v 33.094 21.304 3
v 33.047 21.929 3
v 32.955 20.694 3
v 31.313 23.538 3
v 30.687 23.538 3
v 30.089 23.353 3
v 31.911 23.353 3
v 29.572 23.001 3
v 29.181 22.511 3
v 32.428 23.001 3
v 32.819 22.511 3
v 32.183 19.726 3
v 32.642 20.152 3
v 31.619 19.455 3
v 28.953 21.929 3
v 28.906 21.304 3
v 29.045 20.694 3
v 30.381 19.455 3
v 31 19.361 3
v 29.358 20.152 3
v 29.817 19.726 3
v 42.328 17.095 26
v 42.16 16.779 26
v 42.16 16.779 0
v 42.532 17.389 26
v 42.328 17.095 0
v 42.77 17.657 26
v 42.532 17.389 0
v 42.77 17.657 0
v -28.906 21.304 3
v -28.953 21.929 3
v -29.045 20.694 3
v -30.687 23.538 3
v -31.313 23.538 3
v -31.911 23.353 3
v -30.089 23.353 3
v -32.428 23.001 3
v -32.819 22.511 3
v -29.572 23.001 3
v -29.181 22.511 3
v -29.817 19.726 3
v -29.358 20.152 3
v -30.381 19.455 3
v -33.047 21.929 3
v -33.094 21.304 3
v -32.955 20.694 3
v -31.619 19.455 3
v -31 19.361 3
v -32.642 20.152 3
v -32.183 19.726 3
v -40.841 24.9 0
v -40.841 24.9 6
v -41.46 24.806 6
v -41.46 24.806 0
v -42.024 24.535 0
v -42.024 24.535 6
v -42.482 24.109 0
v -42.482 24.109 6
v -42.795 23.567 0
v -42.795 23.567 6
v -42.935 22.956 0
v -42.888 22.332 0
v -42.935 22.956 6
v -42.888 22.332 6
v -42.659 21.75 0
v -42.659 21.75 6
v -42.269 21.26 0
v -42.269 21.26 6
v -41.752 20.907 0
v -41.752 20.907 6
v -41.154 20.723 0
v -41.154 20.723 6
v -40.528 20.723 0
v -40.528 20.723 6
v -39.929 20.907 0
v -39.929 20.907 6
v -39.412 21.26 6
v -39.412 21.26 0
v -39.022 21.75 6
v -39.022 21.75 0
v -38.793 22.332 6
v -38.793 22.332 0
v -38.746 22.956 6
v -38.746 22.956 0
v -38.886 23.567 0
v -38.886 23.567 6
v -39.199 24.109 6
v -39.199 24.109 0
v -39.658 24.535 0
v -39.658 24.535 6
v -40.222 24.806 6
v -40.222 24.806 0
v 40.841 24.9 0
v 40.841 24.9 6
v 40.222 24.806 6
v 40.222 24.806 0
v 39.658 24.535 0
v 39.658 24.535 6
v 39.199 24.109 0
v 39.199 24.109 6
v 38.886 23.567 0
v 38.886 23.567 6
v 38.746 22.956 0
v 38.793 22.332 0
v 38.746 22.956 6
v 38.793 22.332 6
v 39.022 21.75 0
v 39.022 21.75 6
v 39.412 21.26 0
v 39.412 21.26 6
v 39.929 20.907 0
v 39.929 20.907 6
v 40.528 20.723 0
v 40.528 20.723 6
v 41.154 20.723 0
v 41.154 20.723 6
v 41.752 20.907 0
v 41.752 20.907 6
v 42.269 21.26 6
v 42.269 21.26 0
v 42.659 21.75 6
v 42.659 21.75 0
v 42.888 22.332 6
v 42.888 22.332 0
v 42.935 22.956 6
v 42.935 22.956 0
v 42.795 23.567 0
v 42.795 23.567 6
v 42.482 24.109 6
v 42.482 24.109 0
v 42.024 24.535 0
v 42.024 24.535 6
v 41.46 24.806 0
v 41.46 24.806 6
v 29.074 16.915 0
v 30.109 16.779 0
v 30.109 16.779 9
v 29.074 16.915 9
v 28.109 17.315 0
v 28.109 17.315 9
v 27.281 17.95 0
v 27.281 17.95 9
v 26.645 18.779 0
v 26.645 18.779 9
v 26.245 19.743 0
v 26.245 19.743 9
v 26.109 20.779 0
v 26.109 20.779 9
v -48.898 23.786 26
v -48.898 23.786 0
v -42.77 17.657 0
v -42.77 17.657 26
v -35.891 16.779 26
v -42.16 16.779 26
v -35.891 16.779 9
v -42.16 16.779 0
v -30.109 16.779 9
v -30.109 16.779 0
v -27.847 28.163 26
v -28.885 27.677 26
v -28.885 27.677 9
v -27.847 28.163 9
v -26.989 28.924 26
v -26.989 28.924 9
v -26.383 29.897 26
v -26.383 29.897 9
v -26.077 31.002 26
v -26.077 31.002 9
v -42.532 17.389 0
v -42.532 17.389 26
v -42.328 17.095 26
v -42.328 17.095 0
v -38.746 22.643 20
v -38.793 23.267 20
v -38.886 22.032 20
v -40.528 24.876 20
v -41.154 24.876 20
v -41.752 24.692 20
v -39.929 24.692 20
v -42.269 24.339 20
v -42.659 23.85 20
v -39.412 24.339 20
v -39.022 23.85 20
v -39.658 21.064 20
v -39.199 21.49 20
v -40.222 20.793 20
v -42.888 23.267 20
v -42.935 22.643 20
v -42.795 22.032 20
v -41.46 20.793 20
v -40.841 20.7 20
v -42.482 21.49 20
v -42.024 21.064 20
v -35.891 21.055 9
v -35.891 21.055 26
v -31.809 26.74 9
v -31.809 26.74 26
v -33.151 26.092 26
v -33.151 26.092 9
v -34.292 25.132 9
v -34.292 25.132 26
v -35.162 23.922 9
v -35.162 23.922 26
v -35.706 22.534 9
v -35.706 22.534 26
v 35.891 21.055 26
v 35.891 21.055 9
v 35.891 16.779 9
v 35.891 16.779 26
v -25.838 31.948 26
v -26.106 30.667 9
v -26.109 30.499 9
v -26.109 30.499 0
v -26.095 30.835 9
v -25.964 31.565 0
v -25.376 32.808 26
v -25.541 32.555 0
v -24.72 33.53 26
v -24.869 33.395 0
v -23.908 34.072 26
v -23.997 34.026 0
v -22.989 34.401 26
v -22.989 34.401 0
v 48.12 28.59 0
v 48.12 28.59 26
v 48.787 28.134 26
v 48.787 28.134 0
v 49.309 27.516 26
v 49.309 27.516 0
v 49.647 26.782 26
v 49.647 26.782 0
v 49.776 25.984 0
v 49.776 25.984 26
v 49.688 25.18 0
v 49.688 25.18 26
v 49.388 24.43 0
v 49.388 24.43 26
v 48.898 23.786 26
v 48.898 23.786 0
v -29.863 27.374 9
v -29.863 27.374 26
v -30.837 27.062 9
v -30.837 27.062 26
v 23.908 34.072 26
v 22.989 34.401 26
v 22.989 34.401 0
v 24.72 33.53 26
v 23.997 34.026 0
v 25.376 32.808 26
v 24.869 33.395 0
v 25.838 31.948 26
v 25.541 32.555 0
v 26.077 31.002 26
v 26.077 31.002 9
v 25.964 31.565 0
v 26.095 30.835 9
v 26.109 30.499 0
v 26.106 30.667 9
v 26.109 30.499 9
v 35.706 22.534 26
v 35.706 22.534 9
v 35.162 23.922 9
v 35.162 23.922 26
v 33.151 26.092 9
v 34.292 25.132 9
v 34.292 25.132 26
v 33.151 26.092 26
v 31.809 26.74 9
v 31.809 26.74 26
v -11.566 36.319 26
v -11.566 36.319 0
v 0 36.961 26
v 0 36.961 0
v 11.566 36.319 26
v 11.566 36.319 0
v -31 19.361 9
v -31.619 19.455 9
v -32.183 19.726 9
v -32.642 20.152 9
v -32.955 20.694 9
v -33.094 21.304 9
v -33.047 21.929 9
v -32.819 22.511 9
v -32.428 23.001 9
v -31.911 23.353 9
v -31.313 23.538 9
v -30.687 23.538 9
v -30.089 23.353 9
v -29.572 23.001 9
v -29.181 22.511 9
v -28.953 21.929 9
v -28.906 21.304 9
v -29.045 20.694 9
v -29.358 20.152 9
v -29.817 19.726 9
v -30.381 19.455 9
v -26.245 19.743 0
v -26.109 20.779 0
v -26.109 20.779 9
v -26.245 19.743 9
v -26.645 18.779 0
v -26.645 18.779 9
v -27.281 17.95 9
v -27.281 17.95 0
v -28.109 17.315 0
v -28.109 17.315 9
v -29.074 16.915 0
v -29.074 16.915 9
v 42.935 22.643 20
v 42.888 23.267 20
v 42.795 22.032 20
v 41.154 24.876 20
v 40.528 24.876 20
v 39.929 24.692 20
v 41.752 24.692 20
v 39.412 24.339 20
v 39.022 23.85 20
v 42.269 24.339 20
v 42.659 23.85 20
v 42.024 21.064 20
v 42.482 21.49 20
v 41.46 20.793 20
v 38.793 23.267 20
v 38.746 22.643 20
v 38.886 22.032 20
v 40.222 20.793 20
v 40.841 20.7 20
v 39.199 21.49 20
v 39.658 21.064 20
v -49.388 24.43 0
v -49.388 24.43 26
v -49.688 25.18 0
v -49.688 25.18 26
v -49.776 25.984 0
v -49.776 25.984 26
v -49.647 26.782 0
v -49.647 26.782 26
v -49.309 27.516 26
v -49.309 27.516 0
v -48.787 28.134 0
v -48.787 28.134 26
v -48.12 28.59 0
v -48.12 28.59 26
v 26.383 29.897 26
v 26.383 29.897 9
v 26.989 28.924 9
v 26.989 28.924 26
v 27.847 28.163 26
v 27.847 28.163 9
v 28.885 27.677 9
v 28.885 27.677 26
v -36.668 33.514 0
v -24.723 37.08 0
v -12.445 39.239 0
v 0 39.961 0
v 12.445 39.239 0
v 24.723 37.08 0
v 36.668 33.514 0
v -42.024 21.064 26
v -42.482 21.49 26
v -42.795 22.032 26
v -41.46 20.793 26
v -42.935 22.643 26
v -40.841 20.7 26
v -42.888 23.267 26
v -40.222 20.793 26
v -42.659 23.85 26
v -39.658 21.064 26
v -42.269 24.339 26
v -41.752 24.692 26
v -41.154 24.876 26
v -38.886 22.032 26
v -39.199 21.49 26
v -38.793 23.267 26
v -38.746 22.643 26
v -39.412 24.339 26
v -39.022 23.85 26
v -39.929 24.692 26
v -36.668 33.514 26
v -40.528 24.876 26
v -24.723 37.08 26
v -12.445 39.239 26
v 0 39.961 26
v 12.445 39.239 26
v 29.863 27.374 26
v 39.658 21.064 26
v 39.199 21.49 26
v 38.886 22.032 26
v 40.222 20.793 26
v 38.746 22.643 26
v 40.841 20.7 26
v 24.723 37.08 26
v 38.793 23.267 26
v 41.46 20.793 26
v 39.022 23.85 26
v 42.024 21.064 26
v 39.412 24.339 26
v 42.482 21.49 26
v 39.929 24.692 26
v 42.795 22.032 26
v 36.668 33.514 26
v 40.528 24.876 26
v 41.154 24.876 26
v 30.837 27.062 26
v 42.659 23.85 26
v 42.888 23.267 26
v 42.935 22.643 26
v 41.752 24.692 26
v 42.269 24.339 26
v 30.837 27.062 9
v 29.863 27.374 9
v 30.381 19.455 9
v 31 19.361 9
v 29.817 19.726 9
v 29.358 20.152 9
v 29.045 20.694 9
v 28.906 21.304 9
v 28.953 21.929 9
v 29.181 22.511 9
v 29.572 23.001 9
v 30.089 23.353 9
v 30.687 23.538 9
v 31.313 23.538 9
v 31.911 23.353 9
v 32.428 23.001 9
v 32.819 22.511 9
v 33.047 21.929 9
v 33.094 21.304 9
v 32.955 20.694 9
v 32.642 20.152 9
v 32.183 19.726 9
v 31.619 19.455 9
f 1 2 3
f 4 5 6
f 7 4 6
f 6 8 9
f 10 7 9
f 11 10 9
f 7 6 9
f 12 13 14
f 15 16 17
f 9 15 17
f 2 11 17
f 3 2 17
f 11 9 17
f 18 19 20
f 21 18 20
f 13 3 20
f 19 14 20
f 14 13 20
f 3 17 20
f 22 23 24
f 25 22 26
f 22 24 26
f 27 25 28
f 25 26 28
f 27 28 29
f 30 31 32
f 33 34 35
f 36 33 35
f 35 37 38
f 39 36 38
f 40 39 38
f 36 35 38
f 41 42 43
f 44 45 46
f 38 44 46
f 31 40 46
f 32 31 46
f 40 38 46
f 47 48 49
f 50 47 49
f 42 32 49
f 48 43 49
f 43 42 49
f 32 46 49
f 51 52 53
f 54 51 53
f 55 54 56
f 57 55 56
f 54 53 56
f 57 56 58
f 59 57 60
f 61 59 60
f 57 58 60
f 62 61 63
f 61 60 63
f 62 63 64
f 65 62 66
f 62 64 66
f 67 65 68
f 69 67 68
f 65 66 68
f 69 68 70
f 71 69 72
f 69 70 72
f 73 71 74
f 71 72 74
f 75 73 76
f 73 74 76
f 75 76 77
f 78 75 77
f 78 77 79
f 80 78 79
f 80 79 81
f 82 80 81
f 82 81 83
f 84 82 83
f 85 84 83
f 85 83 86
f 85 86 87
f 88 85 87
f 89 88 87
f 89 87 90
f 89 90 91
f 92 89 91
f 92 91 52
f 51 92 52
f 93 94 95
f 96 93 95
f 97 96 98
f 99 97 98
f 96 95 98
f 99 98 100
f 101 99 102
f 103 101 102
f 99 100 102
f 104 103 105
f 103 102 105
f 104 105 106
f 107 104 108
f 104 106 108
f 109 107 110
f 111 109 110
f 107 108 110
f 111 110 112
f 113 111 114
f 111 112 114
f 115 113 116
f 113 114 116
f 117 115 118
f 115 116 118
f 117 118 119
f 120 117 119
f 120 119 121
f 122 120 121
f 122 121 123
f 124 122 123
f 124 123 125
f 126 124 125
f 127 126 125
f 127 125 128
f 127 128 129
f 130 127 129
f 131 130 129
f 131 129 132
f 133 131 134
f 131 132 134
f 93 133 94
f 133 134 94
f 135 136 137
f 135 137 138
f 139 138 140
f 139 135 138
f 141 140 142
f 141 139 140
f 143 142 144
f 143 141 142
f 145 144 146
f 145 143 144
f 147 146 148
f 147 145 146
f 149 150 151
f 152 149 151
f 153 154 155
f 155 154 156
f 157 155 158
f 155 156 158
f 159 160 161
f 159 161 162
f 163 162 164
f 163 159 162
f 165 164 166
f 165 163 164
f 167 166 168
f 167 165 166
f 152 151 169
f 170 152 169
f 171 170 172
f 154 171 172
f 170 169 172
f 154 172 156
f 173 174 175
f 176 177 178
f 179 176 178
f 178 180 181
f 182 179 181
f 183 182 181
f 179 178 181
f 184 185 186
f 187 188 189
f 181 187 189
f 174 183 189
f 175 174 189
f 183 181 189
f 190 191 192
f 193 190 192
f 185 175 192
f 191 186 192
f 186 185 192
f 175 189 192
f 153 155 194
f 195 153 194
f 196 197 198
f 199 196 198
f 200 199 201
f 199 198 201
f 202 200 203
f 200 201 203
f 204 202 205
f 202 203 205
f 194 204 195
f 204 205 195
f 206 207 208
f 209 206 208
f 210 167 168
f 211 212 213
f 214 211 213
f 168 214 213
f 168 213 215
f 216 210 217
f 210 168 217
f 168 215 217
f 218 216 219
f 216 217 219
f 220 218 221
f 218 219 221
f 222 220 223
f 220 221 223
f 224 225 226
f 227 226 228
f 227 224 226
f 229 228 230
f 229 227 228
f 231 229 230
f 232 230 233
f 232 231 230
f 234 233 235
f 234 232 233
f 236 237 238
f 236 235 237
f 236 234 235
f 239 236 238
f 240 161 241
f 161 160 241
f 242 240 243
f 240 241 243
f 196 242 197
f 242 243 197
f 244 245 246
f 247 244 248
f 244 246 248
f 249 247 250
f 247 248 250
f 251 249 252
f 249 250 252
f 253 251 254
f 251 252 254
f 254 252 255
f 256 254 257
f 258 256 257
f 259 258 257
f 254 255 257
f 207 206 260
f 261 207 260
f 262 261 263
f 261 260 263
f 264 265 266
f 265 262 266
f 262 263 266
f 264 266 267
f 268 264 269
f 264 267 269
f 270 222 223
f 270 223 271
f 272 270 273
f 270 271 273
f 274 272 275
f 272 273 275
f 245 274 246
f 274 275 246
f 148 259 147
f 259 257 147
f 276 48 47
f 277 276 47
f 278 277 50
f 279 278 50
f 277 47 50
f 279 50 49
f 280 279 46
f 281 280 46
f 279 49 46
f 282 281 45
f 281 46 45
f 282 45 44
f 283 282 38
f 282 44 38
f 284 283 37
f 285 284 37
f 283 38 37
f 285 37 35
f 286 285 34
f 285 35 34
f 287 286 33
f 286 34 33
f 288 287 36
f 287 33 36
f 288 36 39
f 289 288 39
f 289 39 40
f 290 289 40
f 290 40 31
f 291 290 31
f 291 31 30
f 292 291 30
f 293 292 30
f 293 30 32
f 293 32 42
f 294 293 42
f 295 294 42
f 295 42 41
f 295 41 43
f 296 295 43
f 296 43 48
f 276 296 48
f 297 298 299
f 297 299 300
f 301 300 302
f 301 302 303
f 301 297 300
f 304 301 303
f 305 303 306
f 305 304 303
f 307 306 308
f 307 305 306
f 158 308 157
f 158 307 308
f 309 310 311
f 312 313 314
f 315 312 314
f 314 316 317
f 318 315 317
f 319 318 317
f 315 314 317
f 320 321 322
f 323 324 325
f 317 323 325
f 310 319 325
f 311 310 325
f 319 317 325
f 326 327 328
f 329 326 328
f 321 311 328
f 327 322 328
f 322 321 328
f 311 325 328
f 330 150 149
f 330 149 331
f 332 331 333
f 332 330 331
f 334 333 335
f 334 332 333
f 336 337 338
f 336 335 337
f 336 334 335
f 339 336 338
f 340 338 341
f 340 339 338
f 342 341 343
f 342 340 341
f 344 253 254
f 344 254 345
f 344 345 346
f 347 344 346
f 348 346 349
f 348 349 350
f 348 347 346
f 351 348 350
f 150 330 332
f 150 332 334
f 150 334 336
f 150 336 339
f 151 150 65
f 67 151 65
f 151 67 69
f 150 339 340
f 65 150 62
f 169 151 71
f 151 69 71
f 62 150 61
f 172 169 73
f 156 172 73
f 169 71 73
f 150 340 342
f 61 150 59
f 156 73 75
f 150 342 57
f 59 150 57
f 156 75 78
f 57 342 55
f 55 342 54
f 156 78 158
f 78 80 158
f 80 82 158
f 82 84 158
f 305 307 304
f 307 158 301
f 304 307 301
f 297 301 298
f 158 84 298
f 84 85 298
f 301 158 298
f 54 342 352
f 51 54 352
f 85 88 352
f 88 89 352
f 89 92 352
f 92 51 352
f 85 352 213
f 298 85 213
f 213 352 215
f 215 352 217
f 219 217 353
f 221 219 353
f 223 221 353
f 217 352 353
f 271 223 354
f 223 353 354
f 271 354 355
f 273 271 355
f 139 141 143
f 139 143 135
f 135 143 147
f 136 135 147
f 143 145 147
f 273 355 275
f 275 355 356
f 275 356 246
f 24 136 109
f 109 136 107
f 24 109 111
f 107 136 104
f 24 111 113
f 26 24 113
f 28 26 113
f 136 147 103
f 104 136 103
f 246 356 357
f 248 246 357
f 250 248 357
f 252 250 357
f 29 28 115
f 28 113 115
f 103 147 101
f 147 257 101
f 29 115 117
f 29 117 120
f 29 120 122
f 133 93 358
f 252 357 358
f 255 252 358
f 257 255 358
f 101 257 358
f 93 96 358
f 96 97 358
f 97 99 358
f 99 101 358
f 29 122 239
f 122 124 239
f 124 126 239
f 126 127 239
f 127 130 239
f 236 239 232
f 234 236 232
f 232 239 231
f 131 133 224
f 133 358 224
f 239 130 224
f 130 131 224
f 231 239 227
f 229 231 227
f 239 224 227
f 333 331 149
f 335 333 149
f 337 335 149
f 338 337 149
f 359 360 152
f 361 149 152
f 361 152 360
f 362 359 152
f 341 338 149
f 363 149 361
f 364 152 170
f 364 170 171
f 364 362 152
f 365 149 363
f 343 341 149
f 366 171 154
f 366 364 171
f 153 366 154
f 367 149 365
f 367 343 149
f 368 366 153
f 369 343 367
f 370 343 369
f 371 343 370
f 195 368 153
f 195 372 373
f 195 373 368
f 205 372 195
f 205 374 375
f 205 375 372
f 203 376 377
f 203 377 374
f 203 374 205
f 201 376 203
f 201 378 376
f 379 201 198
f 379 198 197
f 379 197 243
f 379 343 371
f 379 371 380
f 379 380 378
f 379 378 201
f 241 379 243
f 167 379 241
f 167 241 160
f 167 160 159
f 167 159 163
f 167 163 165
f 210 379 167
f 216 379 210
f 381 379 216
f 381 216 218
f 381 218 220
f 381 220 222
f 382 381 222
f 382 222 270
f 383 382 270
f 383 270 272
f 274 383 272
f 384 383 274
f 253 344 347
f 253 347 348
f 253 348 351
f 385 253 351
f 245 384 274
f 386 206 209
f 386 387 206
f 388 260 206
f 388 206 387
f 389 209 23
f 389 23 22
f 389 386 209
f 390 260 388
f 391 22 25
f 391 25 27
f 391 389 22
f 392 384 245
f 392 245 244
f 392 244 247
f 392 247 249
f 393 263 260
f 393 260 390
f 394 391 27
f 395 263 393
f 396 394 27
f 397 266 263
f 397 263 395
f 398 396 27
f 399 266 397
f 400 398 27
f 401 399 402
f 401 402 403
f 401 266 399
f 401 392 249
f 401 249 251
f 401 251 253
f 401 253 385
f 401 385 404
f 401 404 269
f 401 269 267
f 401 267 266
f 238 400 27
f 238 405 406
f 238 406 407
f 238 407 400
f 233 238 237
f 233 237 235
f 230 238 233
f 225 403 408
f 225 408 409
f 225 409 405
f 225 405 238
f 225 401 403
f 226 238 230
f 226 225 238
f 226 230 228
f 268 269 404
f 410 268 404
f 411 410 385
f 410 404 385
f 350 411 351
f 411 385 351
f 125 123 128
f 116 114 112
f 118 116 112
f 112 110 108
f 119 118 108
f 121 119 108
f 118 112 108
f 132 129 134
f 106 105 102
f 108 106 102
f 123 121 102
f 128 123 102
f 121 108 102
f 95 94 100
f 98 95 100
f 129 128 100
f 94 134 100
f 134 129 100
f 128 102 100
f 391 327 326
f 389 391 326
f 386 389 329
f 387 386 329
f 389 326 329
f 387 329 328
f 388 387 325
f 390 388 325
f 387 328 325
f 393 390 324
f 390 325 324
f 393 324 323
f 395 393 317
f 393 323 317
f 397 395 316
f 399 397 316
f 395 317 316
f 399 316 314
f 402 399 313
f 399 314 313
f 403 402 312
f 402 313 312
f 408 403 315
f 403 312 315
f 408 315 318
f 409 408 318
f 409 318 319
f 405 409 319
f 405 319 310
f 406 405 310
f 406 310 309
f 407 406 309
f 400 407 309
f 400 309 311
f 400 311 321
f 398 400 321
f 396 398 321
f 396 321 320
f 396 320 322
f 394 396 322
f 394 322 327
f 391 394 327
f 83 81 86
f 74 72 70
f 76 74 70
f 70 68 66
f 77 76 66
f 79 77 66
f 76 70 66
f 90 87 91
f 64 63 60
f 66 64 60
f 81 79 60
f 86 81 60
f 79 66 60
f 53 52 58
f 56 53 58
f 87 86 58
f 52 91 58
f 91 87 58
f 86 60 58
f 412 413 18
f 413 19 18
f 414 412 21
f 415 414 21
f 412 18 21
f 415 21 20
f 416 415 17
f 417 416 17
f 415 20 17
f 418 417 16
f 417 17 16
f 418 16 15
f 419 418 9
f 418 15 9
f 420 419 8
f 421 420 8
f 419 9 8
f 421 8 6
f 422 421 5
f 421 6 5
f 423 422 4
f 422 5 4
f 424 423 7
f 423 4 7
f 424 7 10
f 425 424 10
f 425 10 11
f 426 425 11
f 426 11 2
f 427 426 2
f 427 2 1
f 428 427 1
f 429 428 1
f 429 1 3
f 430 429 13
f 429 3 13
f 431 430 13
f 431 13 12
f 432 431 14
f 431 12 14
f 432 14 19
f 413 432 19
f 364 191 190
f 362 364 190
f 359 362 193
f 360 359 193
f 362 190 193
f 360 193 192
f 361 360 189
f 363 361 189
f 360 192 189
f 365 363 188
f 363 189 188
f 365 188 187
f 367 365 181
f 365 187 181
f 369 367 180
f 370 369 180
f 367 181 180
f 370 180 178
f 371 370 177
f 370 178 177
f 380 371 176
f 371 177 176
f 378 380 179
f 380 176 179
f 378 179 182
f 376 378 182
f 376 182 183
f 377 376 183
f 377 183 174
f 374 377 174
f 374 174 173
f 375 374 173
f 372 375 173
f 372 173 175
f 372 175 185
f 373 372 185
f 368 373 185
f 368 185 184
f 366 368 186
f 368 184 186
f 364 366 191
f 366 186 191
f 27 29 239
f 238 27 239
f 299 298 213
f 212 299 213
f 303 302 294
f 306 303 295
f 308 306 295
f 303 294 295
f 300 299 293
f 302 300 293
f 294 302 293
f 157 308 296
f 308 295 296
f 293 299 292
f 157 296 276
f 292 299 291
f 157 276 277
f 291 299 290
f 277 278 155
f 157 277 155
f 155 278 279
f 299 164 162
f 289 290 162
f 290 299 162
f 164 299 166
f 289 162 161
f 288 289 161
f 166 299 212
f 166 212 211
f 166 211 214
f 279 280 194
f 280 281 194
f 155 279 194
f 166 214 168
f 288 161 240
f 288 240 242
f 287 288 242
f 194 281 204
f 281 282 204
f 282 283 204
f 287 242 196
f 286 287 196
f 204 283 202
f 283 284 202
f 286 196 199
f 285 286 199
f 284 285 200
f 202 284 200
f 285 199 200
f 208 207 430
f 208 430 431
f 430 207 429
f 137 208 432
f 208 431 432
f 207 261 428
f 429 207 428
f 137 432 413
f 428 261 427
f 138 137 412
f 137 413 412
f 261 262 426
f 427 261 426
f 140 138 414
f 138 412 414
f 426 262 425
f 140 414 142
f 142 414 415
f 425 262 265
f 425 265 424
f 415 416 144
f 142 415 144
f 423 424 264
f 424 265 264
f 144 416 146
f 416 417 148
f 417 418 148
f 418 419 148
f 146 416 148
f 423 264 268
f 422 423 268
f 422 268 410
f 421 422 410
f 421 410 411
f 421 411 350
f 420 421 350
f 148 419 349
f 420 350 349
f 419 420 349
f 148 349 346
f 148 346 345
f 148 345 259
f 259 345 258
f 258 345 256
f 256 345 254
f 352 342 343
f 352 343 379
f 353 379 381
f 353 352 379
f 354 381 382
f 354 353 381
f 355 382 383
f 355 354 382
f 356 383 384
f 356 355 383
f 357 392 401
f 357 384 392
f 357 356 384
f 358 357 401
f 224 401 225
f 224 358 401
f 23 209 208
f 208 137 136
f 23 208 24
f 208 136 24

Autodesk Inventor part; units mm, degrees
ref_plane "YZ Plane" through (0, 0, 0) normal (1, 0, 0) x (0, 1, 0)
ref_plane "XZ Plane" through (0, 0, 0) normal (0, 1, 0) x (-1, 0, 0)
ref_plane "XY Plane" through (0, 0, 0) normal (0, 0, 1) x (1, 0, 0)
sketch "Sketch1" plane through (0, 0, 0) normal (0, 0, 1) x (1, 0, 0)
  circle A0 centre (40.84062, 22.799513) radius 1.6
  circle A1 centre (-40.84062, 22.799513) radius 1.6
  line L0 (-42.160334, 16.778698) -> (-35.890873, 16.778698)
  line L1 (-35.890873, 16.778698) -> (-35.890873, 21.054791)
  arc A2 (-31.809004, 26.739927) -> (-35.890873, 21.054791) centre (-29.890873, 21.054791) ccw
  arc A3 (31.809004, 26.739927) -> (-31.809004, 26.739927) centre (0, -67.538582) ccw
  arc A4 (35.890873, 21.054791) -> (31.809004, 26.739927) centre (29.890873, 21.054791) ccw
  line L2 (35.890873, 21.054791) -> (35.890873, 16.778698)
  line L3 (35.890873, 16.778698) -> (42.160334, 16.778698)
  arc A5 (42.769553, 17.657377) -> (42.160334, 16.778698) centre (44.890873, 15.536057) ccw
  line L4 (42.769553, 17.657377) -> (48.898315, 23.78614)
  arc A6 (48.898315, 23.78614) -> (48.119875, 28.590121) centre (46.776995, 25.90746) ccw
  arc A7 (48.119875, 28.590121) -> (-48.119875, 28.590121) centre (0, -67.538582) ccw
  arc A8 (-48.119875, 28.590121) -> (-48.898315, 23.78614) centre (-46.776995, 25.90746) ccw
  line L5 (-48.898315, 23.78614) -> (-42.769553, 17.657377)
  arc A9 (-42.160334, 16.778698) -> (-42.769553, 17.657377) centre (-44.890873, 15.536057) ccw
  line L6 (-26.109127, 29.144138) -> (-35.890873, 29.144138) construction
  line L7 (-35.890873, 29.144138) -> (-35.890873, 16.778698) construction
  line L8 (-35.890873, 16.778698) -> (-26.109127, 16.778698)
  line L9 (-26.109127, 16.778698) -> (-26.109127, 29.144138)
  line L10 (-26.109127, 29.144138) -> (-35.890873, 16.778698) construction
  line L11 (-35.890873, 29.144138) -> (-26.109127, 16.778698) construction
  line L12 (-31, 29.144138) -> (-31, 22.961418) construction
  line L13 (-31, 21.461418) -> (-31, 22.961418) construction
  line L14 (-31, 21.461418) -> (-31, 16.778698) construction
  line L15 (0, 31.961418) -> (0, 39.961418) construction
  line L16 (35.890873, 16.778698) -> (35.890873, 21.054791)
  arc A10 (35.890873, 21.054791) -> (31.809004, 26.739927) centre (29.890873, 21.054791) ccw
  line L17 (26.109127, 29.144138) -> (35.890873, 29.144138) construction
  line L18 (35.890873, 29.144138) -> (35.890873, 16.778698) construction
  line L19 (35.890873, 16.778698) -> (26.109127, 16.778698)
  line L20 (26.109127, 16.778698) -> (26.109127, 29.144138)
  line L21 (26.109127, 29.144138) -> (35.890873, 16.778698) construction
  line L22 (35.890873, 29.144138) -> (26.109127, 16.778698) construction
  line L23 (31, 29.144138) -> (31, 22.961418) construction
  line L24 (31, 21.461418) -> (31, 22.961418) construction
  line L25 (31, 21.461418) -> (31, 16.778698) construction
  arc A11 (-32.768069, 29.582495) -> (-38.890873, 21.054791) centre (-29.890873, 21.054791) ccw
  line L26 (-38.890873, 21.054791) -> (-38.890873, 19.778698)
  line L27 (-38.890873, 19.778698) -> (-40.648232, 19.778698)
  arc A12 (-40.648232, 19.778698) -> (-40.648232, 19.778698) centre (-44.890873, 15.536057) ccw
  line L28 (-40.648232, 19.778698) -> (-46.776995, 25.90746)
  arc A13 (-46.776995, 25.90746) -> (-46.776995, 25.90746) centre (-46.776995, 25.90746) ccw
  arc A14 (46.776995, 25.90746) -> (-46.776995, 25.90746) centre (0, -67.538582) ccw
  arc A15 (46.776995, 25.90746) -> (46.776995, 25.90746) centre (46.776995, 25.90746) ccw
  line L29 (46.776995, 25.90746) -> (40.648232, 19.778698)
  arc A16 (40.648232, 19.778698) -> (40.648232, 19.778698) centre (44.890873, 15.536057) ccw
  line L30 (40.648232, 19.778698) -> (38.890873, 19.778698)
  line L31 (38.890873, 19.778698) -> (38.890873, 21.054791)
  arc A17 (38.890873, 21.054791) -> (32.768069, 29.582495) centre (29.890873, 21.054791) ccw
  arc A18 (32.768069, 29.582495) -> (-32.768069, 29.582495) centre (0, -67.538582) ccw
  line L32 (-26.109127, 29.144138) -> (-26.109127, 33.647205)
  line L33 (26.109127, 29.144138) -> (26.109127, 33.647205)
  point P0 (0, 0)
  point P1 (-26.109127, 28.474768)
  point P2 (-31, 22.961418)
  point P3 (31, 22.961418)
  point P4 (26.109127, 28.474768)
  point P5 (-26.109127, 31.580354)
  point P6 (26.109127, 31.580354)
  point P7 (26.109127, 33.647205)
  dimension "d33" = 31
  dimension "d34" = 9
  dimension "d35" = 1.5
  dimension "d50" = 2
sketch "Sketch1 outline for Extrusion1" plane through (0, 0, 0) normal (0, 0, 1) x (1, 0, 0)
  arc A0 (-26.109127, 33.647205) -> (26.109127, 33.647205) centre (0, -67.538582) cw
  line L0 (26.109127, 33.647205) -> (26.109127, 16.778698)
  line L1 (26.109127, 16.778698) -> (42.160334, 16.778698)
  arc A1 (42.160334, 16.778698) -> (42.769553, 17.657377) centre (44.890873, 15.536057) cw
  line L2 (42.769553, 17.657377) -> (48.898315, 23.78614)
  arc A2 (48.898315, 23.78614) -> (48.119875, 28.590121) centre (46.776995, 25.90746) ccw
  arc A3 (48.119875, 28.590121) -> (-48.119875, 28.590121) centre (0, -67.538582) ccw
  arc A4 (-48.119875, 28.590121) -> (-48.898315, 23.78614) centre (-46.776995, 25.90746) ccw
  line L3 (-48.898315, 23.78614) -> (-42.769553, 17.657377)
  arc A5 (-42.769553, 17.657377) -> (-42.160334, 16.778698) centre (-44.890873, 15.536057) cw
  line L4 (-42.160334, 16.778698) -> (-26.109127, 16.778698)
  line L5 (-26.109127, 16.778698) -> (-26.109127, 33.647205)
extrude "Extrusion1" add sketch "Sketch1 outline for Extrusion1" along normal blind 26
sketch "Sketch2" plane through (0, 0, 26) normal (0, 0, 1) x (1, 0, 0)
  point P0 (0, 0)
  point P1 (-40.84062, 22.799513)
  point P2 (40.84062, 22.799513)
hole "Hole1" at (-40.84062, 22.799513, 26) at (40.84062, 22.799513, 26) direction (0, 0, -1) diameter 4.2 depth 6
sketch "Sketch3" plane through (0, 0, 0) normal (0, 0, -1) x (-1, 0, 0)
  point P0 (0, 0)
  point P1 (40.84062, 22.799513)
  point P2 (-40.84062, 22.799513)
hole "Hole2" at (-40.84062, 22.799513, 0) at (40.84062, 22.799513, 0) direction (0, 0, 1) diameter 4.2 depth 6
sketch "Sketch4" plane through (0, 0, 26) normal (0, 0, -1) x (-1, 0, 0)
  arc A0 (35.890873, 21.054791) -> (31.809004, 26.739927) centre (29.890873, 21.054791) ccw
  arc A1 (31.809004, 26.739927) -> (-31.809004, 26.739927) centre (0, -67.538582) ccw
  line L0 (35.890873, 29.144138) -> (35.890873, 16.778698) construction
  line L1 (35.890873, 16.778698) -> (35.890873, 21.054791)
  line L2 (35.890873, 16.778698) -> (26.109127, 16.778698)
  line L3 (26.109127, 16.778698) -> (26.109127, 29.144138)
  line L4 (-26.109127, 28.474768) -> (-26.109127, 16.778698)
  line L5 (-35.890873, 16.778698) -> (-26.109127, 16.778698)
  line L6 (-35.890873, 21.054791) -> (-35.890873, 16.778698)
  arc A2 (-31.809004, 26.739927) -> (-35.890873, 21.054791) centre (-29.890873, 21.054791) ccw
  point P0 (0, 0)
  point P1 (26.109127, 28.474768)
extrude "Extrusion2" cut sketch "Sketch4" along normal blind 17 from surface at 0
fillet "Fillet1" radius 4 6 edges at (-26.1091, 16.7787, 4.5) (26.1091, 16.7787, 4.5) (-26.1091, 33.6472, 13) (26.1091, 33.6472, 13) (-26.1091, 28.4748, 17.5) (26.1091, 28.4748, 17.5)
sketch "Sketch5" plane through (-35.890873, 16.778698, 9) normal (0, 0, 1) x (1, 0, 0)
  point P0 (35.890873, -16.778698)
  point P1 (4.890873, 4.68272)
  point P2 (66.890873, 4.68272)
hole "Hole3" at (-31, 21.461418, 9) at (31, 21.461418, 9) direction (0, 0, -1) diameter 4.2 depth 6
properties part number "Side Wall"
